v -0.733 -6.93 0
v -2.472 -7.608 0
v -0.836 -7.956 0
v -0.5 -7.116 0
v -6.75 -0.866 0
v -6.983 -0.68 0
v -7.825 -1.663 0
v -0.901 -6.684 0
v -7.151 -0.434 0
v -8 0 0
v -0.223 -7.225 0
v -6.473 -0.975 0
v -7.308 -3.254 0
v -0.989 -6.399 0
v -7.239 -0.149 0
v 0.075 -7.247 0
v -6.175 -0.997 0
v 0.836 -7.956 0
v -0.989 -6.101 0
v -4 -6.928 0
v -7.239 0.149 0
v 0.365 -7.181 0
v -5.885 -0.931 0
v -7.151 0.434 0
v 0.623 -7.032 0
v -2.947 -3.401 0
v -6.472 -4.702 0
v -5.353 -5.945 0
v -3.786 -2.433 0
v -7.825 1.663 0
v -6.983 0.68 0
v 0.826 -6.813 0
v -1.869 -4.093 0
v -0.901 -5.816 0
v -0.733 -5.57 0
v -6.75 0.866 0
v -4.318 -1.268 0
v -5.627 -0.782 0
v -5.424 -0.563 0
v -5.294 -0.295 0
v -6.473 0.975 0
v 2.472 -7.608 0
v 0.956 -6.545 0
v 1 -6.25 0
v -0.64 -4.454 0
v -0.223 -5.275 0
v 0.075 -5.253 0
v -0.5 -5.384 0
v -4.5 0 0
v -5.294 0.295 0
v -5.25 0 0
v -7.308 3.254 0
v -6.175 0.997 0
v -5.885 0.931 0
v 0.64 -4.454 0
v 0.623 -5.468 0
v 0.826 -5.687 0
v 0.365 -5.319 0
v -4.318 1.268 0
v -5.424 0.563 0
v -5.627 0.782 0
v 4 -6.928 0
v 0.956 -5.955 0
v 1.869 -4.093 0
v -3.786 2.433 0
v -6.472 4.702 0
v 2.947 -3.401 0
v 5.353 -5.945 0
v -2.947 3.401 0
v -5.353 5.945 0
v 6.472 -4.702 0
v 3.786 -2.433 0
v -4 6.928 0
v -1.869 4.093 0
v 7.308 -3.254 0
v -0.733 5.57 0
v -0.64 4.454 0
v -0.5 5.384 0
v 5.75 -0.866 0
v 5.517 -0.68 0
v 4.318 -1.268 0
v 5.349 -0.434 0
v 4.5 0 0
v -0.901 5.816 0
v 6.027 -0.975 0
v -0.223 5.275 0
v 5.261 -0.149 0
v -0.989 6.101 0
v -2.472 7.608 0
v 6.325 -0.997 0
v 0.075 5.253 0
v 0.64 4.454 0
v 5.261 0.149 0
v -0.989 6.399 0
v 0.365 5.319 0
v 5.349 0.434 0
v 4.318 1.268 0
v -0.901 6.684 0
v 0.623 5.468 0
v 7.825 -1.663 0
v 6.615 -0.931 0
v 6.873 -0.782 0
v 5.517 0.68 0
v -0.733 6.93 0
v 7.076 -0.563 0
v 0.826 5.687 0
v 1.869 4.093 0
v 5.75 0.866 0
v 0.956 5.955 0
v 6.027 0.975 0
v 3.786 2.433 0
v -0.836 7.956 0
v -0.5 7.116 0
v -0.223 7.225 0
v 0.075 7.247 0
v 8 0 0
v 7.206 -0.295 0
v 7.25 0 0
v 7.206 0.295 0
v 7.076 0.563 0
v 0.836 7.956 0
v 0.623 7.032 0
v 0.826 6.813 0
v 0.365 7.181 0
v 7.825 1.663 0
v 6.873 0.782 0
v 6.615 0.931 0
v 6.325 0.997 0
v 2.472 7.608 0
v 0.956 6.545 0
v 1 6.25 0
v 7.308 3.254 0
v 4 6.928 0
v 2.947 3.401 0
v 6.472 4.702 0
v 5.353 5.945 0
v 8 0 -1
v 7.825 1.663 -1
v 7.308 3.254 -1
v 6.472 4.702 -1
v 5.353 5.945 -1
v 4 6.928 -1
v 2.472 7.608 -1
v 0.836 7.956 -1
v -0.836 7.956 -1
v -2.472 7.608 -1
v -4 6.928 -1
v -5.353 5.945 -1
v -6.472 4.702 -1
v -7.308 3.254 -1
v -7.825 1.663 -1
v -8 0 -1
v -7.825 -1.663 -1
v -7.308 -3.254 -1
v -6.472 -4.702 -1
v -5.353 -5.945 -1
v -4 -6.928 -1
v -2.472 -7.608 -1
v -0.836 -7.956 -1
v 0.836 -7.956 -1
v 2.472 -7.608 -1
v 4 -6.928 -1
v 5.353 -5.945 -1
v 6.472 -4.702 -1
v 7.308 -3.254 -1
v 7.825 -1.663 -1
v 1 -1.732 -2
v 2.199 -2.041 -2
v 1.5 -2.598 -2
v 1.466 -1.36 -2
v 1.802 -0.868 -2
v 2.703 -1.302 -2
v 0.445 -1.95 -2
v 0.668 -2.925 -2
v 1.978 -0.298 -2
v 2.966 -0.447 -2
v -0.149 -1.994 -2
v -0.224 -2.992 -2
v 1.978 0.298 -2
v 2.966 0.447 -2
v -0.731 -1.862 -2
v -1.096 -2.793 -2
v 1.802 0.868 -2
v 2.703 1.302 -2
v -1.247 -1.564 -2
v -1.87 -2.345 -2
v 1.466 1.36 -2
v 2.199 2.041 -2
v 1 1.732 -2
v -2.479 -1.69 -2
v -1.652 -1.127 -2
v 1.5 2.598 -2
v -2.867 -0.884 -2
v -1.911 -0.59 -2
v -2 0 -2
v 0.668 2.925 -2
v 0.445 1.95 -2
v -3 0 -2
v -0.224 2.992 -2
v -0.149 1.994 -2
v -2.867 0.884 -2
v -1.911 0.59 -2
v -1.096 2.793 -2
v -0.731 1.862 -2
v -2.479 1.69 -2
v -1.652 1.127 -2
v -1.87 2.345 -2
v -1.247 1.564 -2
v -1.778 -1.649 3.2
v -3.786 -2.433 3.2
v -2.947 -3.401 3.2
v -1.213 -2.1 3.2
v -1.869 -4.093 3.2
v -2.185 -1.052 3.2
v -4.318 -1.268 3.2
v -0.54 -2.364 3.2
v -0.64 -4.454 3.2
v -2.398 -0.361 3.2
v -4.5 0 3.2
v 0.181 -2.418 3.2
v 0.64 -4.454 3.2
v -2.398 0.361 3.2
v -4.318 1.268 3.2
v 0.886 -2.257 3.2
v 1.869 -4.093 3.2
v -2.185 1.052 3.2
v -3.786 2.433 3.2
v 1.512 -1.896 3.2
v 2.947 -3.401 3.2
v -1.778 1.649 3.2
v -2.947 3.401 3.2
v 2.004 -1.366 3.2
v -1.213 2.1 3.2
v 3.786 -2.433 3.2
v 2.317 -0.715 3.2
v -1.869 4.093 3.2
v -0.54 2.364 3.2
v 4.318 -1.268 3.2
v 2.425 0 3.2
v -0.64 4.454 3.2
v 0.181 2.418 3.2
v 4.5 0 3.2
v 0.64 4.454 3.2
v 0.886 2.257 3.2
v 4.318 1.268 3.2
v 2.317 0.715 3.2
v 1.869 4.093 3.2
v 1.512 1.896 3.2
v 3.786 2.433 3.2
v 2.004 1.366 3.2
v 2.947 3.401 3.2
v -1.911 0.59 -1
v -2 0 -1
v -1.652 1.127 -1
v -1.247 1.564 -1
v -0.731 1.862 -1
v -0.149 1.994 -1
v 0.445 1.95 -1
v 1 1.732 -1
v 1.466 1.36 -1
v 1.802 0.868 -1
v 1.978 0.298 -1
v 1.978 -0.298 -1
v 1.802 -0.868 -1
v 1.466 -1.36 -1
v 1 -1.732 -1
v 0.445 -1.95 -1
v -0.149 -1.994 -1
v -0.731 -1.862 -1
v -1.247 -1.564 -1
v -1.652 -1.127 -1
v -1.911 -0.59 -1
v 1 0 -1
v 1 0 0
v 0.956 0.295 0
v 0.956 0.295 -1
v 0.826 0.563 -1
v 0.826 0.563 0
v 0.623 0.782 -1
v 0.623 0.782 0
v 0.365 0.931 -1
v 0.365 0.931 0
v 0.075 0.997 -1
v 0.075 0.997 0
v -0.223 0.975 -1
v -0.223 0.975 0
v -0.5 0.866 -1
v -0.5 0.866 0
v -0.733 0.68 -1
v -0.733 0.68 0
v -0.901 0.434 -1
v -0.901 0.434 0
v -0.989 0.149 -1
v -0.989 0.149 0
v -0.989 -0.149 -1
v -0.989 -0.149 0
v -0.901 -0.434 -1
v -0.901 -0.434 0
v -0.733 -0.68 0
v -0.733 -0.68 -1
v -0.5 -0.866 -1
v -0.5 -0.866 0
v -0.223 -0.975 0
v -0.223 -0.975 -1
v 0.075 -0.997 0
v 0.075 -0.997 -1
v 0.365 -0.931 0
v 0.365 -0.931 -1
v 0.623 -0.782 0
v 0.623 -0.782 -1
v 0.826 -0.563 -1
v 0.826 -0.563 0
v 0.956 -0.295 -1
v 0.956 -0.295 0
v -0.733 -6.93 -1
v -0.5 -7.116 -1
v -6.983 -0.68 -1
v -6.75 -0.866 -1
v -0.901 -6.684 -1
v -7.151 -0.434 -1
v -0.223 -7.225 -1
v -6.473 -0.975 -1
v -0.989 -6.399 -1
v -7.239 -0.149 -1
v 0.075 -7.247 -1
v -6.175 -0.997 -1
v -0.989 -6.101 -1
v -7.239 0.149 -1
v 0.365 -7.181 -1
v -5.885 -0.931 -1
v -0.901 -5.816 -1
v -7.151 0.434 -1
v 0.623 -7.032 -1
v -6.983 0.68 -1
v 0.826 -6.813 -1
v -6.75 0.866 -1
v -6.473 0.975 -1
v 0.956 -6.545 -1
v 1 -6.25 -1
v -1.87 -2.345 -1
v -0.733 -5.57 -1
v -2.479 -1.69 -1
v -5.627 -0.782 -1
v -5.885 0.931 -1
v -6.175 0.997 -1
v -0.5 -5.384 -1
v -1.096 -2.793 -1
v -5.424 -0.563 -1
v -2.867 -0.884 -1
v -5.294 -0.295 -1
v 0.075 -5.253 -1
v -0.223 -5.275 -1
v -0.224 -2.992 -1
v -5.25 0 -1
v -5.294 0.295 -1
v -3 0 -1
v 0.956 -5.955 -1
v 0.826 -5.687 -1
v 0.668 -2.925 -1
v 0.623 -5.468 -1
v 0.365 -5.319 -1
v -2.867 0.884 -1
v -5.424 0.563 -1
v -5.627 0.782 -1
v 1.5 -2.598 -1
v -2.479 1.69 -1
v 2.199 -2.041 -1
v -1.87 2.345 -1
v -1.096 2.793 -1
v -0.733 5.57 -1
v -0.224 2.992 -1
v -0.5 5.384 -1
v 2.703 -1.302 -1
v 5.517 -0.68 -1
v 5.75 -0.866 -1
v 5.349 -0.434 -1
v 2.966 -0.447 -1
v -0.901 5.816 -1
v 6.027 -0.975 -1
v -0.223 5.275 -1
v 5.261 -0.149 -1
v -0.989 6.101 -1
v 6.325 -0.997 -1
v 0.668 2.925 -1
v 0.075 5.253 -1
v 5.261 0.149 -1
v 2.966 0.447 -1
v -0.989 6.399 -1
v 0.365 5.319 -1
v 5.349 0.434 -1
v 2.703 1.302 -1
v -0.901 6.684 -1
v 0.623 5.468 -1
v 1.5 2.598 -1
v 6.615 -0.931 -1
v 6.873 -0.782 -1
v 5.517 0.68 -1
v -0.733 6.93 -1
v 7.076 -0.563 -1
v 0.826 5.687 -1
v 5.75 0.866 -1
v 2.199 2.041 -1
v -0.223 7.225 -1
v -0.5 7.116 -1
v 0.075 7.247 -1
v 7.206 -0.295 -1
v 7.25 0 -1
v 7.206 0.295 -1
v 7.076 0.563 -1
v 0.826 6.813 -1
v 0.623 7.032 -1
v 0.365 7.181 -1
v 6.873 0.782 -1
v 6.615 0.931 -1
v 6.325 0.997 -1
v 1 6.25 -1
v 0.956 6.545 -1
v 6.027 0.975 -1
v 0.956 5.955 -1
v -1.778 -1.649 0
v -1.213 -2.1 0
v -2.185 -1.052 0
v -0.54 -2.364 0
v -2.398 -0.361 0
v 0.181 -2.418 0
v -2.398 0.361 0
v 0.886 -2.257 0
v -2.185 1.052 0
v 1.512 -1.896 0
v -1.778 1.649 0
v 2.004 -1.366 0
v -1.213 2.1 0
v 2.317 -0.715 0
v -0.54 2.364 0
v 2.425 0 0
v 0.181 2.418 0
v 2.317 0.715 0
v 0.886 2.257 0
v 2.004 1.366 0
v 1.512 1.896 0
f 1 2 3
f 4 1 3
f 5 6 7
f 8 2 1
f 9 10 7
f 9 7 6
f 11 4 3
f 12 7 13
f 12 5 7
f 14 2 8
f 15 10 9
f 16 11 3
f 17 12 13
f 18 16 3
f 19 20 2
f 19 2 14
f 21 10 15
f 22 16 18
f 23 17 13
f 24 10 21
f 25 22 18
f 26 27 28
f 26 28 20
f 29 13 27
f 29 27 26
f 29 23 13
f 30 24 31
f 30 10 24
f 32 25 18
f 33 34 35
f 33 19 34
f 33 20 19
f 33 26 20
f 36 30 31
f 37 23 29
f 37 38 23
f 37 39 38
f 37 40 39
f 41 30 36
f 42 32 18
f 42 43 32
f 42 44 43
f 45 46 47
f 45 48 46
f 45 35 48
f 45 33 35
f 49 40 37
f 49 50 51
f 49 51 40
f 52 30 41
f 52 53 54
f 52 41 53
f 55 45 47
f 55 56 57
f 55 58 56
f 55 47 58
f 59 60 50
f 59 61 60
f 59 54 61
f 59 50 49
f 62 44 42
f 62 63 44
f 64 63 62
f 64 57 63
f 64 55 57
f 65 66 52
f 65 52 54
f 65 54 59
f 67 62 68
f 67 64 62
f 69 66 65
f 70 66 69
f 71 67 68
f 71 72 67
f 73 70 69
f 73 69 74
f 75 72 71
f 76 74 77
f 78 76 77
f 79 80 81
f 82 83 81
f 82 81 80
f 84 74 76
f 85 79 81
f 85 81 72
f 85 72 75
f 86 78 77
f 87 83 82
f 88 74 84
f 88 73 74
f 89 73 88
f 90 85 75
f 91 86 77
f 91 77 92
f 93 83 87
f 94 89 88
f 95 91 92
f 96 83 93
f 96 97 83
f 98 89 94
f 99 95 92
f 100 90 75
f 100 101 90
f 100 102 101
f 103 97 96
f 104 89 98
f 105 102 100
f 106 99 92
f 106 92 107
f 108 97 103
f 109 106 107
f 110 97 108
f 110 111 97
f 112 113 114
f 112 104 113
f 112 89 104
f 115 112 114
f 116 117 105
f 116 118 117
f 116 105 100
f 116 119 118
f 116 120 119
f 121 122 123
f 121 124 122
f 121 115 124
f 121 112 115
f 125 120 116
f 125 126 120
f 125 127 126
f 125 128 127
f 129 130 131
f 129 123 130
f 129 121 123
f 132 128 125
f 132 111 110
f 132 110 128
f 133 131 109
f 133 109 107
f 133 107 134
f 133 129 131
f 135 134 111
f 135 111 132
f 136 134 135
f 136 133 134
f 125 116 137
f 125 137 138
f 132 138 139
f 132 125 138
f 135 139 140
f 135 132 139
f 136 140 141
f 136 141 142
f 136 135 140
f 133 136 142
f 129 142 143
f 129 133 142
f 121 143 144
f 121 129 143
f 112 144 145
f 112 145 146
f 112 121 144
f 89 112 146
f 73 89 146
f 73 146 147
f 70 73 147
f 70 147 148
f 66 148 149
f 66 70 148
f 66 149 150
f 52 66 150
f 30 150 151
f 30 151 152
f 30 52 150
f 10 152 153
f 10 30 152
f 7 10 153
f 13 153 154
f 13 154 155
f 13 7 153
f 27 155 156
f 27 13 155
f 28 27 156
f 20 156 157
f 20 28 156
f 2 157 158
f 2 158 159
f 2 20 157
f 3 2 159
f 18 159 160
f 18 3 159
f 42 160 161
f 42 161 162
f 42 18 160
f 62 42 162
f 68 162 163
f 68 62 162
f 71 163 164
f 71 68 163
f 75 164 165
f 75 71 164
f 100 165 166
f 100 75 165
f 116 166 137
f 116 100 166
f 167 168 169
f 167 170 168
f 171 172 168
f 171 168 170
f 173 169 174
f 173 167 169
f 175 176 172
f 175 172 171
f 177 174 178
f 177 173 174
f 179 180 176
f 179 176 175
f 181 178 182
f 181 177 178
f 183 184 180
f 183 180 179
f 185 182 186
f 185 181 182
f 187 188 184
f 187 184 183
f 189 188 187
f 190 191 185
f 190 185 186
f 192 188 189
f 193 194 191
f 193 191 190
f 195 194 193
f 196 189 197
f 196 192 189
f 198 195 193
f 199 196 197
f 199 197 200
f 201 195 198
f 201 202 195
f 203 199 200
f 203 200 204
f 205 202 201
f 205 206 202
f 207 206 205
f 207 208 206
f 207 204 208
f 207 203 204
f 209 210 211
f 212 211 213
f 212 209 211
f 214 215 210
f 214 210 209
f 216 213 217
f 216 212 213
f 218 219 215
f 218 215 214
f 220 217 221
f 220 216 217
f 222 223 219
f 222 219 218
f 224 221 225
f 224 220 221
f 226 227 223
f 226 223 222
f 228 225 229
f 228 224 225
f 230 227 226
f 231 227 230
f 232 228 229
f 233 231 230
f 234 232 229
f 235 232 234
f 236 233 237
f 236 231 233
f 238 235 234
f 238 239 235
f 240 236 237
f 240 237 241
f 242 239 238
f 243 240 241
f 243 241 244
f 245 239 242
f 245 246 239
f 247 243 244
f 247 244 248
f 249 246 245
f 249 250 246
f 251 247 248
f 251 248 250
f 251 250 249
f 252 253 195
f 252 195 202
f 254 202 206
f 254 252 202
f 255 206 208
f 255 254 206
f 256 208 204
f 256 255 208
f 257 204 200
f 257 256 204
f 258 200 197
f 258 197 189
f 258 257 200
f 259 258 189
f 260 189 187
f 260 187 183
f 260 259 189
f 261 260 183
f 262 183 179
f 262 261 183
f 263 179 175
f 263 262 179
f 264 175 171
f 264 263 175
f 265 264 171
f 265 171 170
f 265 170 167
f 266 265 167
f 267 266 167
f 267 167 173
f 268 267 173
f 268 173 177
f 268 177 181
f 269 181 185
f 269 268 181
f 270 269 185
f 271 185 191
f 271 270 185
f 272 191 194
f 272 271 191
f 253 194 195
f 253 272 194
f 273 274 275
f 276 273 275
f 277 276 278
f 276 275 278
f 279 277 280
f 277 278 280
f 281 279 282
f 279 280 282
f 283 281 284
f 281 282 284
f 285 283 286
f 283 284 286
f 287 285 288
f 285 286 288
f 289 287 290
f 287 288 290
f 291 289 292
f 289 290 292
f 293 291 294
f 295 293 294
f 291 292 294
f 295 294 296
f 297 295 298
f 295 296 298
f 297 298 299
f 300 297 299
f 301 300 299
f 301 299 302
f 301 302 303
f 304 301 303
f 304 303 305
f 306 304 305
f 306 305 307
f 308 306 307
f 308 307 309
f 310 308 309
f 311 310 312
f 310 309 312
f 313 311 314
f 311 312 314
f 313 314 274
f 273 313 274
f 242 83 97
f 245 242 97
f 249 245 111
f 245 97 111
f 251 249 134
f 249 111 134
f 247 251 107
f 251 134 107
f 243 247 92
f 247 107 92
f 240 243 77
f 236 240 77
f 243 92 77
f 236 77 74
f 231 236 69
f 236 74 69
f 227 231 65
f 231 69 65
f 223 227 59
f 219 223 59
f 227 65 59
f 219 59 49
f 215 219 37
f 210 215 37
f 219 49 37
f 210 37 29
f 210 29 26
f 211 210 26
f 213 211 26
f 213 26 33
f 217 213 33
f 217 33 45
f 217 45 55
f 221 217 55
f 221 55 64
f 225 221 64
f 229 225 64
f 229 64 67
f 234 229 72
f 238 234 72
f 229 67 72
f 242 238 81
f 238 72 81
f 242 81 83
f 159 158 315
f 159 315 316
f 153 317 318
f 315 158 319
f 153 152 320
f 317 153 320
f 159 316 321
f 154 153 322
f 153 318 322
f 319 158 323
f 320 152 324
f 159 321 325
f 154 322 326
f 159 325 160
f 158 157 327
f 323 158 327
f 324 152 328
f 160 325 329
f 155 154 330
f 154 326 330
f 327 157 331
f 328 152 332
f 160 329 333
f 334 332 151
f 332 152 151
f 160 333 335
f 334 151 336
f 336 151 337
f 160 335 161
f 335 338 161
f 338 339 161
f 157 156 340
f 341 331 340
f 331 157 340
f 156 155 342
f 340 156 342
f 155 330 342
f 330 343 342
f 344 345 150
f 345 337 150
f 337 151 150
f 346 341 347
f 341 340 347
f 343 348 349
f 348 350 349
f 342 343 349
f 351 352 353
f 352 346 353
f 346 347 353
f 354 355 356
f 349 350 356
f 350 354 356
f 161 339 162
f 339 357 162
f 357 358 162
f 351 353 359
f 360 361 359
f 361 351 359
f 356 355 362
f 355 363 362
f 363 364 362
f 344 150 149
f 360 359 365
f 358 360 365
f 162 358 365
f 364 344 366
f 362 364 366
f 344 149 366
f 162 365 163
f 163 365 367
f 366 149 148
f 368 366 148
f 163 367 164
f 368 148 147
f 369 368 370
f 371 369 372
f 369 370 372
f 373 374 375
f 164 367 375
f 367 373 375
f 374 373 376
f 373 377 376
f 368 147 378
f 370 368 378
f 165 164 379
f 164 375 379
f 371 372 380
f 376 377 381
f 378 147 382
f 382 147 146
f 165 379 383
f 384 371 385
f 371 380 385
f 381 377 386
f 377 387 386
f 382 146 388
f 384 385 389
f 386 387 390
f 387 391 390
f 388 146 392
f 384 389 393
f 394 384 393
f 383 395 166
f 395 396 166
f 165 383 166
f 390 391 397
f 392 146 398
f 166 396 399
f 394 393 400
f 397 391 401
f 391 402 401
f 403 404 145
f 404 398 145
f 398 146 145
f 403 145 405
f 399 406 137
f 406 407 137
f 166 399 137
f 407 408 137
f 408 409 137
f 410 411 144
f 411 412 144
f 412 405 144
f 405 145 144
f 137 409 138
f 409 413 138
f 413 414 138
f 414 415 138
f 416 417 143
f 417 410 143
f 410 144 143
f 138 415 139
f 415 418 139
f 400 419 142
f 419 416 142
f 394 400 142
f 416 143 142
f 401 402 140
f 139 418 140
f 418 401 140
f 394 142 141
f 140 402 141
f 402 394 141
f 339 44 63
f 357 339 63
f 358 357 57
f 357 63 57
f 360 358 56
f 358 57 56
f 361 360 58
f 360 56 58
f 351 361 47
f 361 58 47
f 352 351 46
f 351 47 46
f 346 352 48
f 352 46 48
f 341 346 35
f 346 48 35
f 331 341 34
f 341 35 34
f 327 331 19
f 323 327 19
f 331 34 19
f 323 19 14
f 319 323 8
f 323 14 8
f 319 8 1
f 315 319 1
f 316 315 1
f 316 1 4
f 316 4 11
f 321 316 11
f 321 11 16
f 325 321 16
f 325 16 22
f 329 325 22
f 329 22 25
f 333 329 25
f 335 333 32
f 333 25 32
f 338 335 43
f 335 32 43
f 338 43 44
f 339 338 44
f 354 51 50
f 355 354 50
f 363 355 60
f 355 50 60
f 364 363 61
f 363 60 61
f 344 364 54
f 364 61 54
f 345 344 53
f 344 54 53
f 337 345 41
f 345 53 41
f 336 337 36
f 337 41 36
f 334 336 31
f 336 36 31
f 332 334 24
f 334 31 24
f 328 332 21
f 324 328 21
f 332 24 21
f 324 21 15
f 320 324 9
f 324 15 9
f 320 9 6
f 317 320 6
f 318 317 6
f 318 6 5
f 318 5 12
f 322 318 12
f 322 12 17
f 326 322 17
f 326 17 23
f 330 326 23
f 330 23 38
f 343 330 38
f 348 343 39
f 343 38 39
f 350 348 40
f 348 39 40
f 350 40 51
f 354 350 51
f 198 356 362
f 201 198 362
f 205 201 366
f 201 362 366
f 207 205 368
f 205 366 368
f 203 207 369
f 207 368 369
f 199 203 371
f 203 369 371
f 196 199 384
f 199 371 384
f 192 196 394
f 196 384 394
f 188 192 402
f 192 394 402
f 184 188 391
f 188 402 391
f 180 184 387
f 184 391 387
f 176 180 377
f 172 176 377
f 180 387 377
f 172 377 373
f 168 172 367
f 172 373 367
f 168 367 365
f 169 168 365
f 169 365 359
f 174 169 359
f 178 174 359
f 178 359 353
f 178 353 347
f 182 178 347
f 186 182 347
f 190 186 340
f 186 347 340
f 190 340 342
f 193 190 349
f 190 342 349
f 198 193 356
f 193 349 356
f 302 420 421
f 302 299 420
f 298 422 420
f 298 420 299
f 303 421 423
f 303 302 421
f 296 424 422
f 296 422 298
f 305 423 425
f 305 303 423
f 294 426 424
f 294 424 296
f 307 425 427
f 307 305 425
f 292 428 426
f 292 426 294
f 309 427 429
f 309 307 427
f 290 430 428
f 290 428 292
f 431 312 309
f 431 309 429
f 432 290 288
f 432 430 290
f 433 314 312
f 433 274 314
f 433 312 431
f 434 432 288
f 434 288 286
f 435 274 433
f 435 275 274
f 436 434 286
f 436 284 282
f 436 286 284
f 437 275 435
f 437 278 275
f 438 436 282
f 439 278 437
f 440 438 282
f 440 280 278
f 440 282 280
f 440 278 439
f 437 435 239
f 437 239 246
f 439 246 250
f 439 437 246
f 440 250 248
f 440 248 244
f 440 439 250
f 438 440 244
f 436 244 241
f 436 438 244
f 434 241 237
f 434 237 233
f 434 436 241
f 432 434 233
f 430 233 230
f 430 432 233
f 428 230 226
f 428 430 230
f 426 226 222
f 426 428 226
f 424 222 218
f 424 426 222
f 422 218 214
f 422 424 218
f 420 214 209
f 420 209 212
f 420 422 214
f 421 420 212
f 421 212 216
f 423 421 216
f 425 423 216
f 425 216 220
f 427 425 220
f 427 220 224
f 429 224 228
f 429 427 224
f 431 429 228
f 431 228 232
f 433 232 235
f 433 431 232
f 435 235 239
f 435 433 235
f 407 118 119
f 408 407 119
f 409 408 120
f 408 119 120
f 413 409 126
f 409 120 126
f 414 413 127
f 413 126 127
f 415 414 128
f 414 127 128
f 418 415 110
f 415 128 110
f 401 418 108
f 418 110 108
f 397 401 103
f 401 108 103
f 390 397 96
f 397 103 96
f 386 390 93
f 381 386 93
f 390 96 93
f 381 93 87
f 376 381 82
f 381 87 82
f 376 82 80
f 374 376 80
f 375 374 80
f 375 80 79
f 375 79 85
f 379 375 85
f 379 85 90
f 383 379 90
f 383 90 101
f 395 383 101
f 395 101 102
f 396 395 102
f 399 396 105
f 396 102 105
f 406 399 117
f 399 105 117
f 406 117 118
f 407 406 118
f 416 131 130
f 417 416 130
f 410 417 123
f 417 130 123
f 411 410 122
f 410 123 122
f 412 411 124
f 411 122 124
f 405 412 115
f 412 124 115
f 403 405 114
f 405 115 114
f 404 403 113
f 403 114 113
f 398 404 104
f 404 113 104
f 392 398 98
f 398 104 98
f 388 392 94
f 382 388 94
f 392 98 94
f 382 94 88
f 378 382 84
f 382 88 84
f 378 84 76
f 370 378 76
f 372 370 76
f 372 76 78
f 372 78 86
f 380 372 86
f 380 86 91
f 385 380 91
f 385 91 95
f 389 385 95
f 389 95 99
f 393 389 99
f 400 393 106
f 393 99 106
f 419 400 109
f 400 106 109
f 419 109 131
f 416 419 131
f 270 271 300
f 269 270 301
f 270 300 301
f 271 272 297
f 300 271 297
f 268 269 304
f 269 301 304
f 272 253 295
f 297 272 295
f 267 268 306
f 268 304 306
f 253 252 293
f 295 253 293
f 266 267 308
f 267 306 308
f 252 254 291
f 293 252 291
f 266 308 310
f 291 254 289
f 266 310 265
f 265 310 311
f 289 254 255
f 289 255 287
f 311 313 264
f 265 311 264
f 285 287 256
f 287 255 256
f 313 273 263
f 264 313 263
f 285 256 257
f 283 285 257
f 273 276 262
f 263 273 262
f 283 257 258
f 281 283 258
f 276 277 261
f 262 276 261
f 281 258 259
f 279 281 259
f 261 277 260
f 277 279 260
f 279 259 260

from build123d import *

# Parameters (mm, degrees)
SKETCH1_R           = 4.5
SKETCH1_R_2         = 2.425
BOSS_EXTRUDE1_DEPTH = 3.2
SKETCH1_3_R         = 8
SKETCH1_3_R_2       = 1
BOSS_EXTRUDE2_DEPTH = 1
SKETCH2_R           = 3
SKETCH2_R_2         = 2
BOSS_EXTRUDE3_DEPTH = 1


with BuildPart() as part:
    # Sketch1 → Boss-Extrude1 (new body)
    with BuildSketch(Plane.XY):
        Circle(SKETCH1_R)
        Circle(SKETCH1_R_2, mode=Mode.SUBTRACT)
    extrude(amount=BOSS_EXTRUDE1_DEPTH)

    # Sketch1<3> → Boss-Extrude2 (add)
    with BuildSketch(Plane.XY):
        Circle(SKETCH1_3_R)
        with Locations((6.25, 0)):
            Circle(SKETCH1_3_R_2, mode=Mode.SUBTRACT)
        with Locations((0, -6.25)):
            Circle(SKETCH1_3_R_2, mode=Mode.SUBTRACT)
        with Locations((-6.25, 0)):
            Circle(SKETCH1_3_R_2, mode=Mode.SUBTRACT)
        with Locations((0, 6.25)):
            Circle(SKETCH1_3_R_2, mode=Mode.SUBTRACT)
        Circle(SKETCH1_3_R_2, mode=Mode.SUBTRACT)
    extrude(amount=-BOSS_EXTRUDE2_DEPTH)

    # Sketch2 → Boss-Extrude3 (add)
    with BuildSketch(Plane(origin=(0, 0, -1), x_dir=(-1, 0, 0), z_dir=(0, 0, -1))):
        Circle(SKETCH2_R)
        Circle(SKETCH2_R_2, mode=Mode.SUBTRACT)
    extrude(amount=BOSS_EXTRUDE3_DEPTH)


solid = part.part
